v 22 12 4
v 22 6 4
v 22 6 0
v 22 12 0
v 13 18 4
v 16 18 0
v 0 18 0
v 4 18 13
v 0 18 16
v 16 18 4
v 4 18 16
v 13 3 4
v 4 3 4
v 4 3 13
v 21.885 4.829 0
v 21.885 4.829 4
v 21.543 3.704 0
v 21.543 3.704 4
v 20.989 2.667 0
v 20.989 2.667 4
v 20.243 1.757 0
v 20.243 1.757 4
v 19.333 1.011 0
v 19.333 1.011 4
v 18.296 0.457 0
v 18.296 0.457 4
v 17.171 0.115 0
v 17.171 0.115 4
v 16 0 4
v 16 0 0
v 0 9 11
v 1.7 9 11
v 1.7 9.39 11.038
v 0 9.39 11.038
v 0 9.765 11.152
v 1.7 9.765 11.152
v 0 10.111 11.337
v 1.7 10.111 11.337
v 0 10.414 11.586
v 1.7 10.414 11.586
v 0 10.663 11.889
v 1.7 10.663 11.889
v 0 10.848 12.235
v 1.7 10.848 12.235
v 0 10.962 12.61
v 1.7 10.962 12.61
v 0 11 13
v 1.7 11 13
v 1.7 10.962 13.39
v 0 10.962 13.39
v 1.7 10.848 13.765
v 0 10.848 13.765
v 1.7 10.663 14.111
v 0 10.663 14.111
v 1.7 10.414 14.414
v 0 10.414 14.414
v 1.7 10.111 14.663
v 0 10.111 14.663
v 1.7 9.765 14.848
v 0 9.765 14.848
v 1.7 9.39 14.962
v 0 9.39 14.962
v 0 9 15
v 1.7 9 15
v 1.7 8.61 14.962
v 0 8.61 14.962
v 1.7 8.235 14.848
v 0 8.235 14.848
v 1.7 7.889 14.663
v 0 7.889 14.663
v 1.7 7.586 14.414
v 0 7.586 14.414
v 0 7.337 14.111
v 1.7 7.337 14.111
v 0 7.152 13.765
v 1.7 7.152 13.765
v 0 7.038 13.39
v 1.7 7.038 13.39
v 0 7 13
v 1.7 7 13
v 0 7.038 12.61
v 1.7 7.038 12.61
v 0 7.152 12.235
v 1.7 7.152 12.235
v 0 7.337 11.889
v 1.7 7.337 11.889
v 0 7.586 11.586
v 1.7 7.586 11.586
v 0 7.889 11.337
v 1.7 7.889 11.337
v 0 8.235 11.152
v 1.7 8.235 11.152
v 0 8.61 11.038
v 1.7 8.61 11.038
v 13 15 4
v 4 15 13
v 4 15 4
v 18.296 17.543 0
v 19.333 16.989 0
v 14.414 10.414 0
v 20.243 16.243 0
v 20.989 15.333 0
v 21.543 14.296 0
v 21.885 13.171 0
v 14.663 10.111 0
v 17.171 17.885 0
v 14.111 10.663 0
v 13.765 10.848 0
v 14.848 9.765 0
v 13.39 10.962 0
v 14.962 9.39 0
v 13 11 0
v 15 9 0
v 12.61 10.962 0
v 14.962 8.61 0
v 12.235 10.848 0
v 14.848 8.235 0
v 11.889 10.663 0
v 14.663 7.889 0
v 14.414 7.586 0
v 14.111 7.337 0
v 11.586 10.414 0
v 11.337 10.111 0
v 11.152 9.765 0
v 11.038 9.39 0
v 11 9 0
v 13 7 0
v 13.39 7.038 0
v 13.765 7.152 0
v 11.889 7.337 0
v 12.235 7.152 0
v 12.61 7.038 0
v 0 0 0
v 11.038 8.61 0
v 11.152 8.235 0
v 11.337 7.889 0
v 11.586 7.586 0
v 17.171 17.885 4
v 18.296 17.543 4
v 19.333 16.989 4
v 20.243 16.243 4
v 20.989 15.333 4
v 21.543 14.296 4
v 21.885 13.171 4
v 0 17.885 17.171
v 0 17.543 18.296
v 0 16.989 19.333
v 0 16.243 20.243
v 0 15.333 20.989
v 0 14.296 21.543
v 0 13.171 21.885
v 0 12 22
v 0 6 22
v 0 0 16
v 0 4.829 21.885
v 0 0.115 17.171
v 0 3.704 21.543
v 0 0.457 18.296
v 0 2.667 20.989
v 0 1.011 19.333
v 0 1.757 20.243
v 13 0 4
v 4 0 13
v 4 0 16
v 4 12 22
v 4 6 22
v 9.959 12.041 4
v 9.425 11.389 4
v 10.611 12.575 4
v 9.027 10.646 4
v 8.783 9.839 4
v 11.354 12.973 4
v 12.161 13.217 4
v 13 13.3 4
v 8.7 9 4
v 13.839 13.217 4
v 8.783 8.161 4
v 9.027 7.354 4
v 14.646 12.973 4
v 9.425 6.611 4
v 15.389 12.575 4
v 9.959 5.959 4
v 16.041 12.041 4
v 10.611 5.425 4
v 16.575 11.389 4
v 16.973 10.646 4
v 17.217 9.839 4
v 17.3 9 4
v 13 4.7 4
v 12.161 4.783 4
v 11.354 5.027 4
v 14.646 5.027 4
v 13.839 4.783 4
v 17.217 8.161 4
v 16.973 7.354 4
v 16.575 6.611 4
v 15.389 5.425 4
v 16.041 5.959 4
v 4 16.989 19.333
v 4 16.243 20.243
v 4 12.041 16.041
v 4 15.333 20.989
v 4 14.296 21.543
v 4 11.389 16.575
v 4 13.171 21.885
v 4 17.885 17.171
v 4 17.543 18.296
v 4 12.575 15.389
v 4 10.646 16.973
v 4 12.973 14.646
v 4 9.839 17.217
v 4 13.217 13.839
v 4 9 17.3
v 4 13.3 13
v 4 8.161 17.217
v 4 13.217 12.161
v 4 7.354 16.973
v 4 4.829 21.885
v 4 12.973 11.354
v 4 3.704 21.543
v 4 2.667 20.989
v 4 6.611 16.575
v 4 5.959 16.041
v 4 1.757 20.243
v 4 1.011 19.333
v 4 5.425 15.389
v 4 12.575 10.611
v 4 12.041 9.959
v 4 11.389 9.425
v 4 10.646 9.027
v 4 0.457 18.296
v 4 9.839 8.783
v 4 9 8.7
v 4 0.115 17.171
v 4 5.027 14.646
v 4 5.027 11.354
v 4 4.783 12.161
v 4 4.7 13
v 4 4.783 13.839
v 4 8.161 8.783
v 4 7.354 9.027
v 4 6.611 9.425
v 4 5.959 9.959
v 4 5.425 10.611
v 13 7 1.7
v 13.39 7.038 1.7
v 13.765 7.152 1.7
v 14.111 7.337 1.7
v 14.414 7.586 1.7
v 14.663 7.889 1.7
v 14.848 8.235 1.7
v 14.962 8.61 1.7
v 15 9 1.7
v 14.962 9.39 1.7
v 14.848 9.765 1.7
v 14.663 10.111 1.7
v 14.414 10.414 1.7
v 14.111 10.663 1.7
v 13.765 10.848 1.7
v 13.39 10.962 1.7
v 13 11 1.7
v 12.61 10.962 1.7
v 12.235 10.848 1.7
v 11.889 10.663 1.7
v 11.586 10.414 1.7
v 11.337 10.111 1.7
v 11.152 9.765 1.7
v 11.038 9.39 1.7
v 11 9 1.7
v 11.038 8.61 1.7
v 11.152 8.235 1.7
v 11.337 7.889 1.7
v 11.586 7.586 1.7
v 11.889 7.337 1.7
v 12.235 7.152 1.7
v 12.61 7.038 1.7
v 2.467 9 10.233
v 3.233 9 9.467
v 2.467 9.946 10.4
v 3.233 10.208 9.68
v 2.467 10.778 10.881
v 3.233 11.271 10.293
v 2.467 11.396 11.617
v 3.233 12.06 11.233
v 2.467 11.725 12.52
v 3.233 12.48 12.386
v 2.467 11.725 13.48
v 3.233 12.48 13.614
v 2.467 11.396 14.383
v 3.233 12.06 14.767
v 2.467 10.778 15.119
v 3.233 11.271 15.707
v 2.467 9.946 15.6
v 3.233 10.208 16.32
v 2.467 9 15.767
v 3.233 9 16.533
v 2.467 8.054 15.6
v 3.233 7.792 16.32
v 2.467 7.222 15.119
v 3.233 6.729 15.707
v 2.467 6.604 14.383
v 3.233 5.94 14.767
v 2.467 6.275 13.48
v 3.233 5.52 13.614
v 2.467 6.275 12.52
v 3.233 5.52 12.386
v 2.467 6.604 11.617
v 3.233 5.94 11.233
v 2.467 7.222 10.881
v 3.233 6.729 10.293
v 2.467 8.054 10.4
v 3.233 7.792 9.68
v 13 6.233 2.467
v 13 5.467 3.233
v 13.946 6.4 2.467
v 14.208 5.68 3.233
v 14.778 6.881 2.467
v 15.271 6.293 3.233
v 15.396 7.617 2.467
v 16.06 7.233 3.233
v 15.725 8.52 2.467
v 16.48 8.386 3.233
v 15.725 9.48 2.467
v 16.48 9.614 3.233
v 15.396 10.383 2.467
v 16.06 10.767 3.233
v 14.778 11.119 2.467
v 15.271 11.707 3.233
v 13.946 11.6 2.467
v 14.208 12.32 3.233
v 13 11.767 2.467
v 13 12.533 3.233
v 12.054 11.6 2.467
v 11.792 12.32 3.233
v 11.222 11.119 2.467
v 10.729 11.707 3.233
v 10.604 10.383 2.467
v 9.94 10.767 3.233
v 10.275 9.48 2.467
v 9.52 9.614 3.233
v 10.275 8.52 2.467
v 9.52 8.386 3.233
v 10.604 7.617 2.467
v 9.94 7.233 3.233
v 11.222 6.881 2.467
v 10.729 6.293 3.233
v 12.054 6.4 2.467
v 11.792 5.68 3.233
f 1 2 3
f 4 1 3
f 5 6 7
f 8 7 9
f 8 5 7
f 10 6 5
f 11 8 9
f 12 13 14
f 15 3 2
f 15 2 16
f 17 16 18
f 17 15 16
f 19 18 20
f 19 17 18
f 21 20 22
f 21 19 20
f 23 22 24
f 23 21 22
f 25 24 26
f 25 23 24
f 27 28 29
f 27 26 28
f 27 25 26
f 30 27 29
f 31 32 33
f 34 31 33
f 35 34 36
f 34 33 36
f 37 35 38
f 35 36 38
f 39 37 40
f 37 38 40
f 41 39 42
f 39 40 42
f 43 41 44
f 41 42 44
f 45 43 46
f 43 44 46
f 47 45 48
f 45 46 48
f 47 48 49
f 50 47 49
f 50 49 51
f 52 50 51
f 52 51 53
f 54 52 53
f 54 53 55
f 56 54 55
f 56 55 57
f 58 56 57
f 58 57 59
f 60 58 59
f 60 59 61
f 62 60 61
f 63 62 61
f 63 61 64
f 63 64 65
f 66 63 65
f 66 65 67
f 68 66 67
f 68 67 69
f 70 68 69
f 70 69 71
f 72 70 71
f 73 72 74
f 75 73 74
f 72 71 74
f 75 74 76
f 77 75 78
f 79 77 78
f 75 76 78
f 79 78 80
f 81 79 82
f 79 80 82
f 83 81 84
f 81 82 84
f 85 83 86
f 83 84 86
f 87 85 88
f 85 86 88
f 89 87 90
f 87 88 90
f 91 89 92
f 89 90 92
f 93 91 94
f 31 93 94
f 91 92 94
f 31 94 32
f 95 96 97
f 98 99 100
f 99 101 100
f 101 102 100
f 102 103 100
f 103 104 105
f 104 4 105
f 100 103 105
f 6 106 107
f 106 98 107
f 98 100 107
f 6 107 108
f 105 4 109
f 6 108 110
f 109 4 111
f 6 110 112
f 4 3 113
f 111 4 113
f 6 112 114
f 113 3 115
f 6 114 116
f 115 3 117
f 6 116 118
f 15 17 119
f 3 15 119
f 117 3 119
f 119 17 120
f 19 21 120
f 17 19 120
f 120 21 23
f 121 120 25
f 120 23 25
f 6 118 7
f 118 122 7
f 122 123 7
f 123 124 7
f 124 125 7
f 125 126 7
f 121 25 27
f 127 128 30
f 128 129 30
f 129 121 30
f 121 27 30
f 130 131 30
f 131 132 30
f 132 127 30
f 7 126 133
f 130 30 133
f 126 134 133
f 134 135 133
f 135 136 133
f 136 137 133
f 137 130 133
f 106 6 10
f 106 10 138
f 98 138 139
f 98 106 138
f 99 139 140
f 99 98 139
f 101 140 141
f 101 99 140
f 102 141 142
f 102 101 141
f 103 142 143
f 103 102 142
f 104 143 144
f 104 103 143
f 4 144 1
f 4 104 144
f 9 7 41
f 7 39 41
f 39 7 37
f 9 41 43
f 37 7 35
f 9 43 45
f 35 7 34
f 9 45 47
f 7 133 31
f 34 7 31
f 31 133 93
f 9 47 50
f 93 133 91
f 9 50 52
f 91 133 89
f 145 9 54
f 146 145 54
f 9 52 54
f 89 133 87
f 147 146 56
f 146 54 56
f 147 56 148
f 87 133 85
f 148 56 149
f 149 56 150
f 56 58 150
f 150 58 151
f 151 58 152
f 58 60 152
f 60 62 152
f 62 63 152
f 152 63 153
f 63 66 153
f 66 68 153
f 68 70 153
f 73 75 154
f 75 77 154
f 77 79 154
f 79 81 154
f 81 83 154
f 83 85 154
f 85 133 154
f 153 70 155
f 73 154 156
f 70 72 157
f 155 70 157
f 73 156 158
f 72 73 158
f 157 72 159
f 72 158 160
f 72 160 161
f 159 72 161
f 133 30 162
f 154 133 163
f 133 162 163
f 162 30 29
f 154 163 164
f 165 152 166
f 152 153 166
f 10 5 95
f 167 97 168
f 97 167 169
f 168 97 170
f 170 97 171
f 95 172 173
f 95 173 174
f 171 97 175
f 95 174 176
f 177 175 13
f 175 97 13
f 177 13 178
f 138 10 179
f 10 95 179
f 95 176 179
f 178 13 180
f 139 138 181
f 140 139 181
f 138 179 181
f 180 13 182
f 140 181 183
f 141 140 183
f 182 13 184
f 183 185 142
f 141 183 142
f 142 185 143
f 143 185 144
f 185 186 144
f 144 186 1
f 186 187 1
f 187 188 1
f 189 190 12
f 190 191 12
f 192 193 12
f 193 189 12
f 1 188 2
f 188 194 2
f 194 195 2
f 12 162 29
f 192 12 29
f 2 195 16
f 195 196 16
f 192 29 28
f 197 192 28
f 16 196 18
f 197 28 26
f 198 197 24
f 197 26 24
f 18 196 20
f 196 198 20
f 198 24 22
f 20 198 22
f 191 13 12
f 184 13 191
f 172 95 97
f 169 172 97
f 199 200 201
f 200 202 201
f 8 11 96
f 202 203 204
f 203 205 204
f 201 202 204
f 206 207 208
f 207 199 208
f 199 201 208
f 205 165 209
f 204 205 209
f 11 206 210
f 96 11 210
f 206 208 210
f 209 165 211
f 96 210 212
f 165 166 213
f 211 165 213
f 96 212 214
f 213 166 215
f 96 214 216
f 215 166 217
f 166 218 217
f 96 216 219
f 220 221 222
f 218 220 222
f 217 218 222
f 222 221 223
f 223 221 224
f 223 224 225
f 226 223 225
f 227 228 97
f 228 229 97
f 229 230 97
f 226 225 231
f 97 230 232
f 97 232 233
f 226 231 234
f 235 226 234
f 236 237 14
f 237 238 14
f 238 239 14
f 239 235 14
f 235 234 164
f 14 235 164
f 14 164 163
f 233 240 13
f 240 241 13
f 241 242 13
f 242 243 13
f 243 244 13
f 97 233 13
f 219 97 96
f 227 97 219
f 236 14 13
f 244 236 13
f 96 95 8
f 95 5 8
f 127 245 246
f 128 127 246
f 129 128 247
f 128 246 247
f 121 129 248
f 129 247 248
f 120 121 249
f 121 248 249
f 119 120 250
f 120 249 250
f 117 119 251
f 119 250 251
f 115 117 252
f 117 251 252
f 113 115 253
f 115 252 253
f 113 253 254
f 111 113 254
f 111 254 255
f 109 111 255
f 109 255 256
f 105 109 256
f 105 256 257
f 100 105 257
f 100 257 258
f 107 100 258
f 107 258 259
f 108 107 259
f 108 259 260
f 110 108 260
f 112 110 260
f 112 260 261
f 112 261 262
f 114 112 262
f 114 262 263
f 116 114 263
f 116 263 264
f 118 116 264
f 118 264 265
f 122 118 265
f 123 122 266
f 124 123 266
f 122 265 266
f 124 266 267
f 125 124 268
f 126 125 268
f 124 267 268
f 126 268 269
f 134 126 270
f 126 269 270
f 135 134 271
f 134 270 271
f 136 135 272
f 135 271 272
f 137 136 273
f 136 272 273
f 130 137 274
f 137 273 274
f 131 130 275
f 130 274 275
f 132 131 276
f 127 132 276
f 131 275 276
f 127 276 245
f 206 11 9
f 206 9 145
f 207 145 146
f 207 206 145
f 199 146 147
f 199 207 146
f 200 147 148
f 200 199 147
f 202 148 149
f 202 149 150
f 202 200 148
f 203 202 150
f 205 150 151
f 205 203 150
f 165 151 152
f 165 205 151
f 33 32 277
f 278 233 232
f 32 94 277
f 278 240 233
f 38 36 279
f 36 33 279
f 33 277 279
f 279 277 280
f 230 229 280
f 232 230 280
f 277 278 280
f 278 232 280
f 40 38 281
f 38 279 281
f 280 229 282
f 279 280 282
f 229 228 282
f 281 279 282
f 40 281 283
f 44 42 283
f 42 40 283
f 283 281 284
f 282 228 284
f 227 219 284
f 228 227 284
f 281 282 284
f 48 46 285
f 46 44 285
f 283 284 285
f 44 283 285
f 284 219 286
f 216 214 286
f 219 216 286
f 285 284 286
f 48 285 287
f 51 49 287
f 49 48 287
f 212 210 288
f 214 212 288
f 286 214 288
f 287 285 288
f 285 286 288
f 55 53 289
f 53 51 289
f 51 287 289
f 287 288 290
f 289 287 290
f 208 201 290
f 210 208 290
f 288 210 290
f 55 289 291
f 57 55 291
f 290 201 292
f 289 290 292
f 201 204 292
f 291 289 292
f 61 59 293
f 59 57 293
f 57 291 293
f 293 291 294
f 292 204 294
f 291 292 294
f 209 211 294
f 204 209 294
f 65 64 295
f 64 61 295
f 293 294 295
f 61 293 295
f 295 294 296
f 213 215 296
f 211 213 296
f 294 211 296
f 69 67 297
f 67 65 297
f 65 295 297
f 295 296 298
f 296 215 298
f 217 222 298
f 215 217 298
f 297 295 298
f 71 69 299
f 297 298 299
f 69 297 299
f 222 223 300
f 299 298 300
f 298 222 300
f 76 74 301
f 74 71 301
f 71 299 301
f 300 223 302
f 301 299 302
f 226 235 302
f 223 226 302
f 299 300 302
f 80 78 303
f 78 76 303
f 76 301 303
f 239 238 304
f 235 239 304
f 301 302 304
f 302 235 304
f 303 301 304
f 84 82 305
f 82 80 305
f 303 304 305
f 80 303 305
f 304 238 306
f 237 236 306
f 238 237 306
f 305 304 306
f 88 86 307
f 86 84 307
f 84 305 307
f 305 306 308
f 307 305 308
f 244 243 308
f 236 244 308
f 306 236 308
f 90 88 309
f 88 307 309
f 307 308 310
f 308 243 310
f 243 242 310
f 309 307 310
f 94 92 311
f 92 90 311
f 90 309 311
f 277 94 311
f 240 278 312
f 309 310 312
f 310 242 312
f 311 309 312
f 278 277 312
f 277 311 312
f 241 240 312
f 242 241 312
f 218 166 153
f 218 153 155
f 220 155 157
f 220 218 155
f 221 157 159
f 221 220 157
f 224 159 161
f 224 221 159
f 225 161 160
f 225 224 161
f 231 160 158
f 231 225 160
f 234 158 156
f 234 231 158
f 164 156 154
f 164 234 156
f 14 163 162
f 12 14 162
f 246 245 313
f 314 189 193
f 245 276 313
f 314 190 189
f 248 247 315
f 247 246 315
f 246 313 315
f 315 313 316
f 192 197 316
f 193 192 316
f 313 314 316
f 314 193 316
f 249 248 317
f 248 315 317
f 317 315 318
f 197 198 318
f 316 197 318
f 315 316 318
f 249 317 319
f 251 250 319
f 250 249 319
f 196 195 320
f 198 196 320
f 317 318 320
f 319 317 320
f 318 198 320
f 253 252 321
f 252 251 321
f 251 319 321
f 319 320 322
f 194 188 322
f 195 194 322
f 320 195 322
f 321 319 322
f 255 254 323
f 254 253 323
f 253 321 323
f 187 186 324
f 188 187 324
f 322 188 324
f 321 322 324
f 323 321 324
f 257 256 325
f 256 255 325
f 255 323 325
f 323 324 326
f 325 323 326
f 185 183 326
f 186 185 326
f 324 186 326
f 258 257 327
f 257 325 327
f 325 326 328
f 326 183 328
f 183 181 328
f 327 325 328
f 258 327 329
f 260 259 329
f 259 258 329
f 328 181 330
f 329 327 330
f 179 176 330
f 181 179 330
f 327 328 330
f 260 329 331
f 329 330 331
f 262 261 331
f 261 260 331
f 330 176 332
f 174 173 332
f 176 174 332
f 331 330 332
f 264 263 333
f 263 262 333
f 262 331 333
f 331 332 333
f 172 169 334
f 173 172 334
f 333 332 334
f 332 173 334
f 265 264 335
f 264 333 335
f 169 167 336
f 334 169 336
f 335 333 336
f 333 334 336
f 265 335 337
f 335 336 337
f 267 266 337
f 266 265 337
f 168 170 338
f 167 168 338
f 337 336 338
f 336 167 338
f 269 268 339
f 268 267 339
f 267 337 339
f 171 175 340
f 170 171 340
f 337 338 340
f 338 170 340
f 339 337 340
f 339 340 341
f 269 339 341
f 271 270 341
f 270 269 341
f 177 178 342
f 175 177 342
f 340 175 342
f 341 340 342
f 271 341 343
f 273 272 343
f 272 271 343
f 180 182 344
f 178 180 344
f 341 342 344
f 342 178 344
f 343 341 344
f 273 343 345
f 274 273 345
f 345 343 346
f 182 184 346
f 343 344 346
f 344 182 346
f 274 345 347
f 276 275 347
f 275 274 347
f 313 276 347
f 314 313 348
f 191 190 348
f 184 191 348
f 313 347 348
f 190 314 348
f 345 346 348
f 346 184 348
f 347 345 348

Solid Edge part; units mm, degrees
sketch "Sketch1" plane through (0, 0, 0) normal (0, -1, 0) x (1, 0, 0)
  line L0 (4, 22) -> (4, 4)
  line L1 (4, 4) -> (22, 4)
  line L2 (22, 4) -> (22, 0)
  line L3 (22, 0) -> (0, 0)
  line L4 (0, 0) -> (0, 22)
  line L5 (0, 22) -> (4, 22)
extrude "Protrusion1" add sketch "Sketch1" against normal blind 18
hole "Agujero_1" at (13, 9, 4) direction (0, 0, -1) diameter 4 end up to next
hole "Agujero_2" at (4, 9, 13) direction (-1, 0, 0) diameter 4 end up to next
sketch "Sketch2" plane through (11, 0, 11) normal (0, -1, 0) x (1, 0, 0)
  line L0 (-7, 2) -> (2, -7)
  line L1 (2, -7) -> (-7, -7)
  line L2 (-7, -7) -> (-7, 2)
extrude "ProtrusiónExtruida_2" add sketch "Sketch2" against normal blind 3
mirror "Mirror1" about plane through (11, 9, 11) normal (0, -1, 0) of "ProtrusiónExtruida_2"
fillet "Redondeo_2" radius 6 4 edges at (2, 0, 22) (2, 18, 22) (22, 18, 2) (22, 0, 2)
chamfer "Chaflán_1" distance 2.3 angle 45 2 edges at (11, 9, 4) (4, 7, 13)
